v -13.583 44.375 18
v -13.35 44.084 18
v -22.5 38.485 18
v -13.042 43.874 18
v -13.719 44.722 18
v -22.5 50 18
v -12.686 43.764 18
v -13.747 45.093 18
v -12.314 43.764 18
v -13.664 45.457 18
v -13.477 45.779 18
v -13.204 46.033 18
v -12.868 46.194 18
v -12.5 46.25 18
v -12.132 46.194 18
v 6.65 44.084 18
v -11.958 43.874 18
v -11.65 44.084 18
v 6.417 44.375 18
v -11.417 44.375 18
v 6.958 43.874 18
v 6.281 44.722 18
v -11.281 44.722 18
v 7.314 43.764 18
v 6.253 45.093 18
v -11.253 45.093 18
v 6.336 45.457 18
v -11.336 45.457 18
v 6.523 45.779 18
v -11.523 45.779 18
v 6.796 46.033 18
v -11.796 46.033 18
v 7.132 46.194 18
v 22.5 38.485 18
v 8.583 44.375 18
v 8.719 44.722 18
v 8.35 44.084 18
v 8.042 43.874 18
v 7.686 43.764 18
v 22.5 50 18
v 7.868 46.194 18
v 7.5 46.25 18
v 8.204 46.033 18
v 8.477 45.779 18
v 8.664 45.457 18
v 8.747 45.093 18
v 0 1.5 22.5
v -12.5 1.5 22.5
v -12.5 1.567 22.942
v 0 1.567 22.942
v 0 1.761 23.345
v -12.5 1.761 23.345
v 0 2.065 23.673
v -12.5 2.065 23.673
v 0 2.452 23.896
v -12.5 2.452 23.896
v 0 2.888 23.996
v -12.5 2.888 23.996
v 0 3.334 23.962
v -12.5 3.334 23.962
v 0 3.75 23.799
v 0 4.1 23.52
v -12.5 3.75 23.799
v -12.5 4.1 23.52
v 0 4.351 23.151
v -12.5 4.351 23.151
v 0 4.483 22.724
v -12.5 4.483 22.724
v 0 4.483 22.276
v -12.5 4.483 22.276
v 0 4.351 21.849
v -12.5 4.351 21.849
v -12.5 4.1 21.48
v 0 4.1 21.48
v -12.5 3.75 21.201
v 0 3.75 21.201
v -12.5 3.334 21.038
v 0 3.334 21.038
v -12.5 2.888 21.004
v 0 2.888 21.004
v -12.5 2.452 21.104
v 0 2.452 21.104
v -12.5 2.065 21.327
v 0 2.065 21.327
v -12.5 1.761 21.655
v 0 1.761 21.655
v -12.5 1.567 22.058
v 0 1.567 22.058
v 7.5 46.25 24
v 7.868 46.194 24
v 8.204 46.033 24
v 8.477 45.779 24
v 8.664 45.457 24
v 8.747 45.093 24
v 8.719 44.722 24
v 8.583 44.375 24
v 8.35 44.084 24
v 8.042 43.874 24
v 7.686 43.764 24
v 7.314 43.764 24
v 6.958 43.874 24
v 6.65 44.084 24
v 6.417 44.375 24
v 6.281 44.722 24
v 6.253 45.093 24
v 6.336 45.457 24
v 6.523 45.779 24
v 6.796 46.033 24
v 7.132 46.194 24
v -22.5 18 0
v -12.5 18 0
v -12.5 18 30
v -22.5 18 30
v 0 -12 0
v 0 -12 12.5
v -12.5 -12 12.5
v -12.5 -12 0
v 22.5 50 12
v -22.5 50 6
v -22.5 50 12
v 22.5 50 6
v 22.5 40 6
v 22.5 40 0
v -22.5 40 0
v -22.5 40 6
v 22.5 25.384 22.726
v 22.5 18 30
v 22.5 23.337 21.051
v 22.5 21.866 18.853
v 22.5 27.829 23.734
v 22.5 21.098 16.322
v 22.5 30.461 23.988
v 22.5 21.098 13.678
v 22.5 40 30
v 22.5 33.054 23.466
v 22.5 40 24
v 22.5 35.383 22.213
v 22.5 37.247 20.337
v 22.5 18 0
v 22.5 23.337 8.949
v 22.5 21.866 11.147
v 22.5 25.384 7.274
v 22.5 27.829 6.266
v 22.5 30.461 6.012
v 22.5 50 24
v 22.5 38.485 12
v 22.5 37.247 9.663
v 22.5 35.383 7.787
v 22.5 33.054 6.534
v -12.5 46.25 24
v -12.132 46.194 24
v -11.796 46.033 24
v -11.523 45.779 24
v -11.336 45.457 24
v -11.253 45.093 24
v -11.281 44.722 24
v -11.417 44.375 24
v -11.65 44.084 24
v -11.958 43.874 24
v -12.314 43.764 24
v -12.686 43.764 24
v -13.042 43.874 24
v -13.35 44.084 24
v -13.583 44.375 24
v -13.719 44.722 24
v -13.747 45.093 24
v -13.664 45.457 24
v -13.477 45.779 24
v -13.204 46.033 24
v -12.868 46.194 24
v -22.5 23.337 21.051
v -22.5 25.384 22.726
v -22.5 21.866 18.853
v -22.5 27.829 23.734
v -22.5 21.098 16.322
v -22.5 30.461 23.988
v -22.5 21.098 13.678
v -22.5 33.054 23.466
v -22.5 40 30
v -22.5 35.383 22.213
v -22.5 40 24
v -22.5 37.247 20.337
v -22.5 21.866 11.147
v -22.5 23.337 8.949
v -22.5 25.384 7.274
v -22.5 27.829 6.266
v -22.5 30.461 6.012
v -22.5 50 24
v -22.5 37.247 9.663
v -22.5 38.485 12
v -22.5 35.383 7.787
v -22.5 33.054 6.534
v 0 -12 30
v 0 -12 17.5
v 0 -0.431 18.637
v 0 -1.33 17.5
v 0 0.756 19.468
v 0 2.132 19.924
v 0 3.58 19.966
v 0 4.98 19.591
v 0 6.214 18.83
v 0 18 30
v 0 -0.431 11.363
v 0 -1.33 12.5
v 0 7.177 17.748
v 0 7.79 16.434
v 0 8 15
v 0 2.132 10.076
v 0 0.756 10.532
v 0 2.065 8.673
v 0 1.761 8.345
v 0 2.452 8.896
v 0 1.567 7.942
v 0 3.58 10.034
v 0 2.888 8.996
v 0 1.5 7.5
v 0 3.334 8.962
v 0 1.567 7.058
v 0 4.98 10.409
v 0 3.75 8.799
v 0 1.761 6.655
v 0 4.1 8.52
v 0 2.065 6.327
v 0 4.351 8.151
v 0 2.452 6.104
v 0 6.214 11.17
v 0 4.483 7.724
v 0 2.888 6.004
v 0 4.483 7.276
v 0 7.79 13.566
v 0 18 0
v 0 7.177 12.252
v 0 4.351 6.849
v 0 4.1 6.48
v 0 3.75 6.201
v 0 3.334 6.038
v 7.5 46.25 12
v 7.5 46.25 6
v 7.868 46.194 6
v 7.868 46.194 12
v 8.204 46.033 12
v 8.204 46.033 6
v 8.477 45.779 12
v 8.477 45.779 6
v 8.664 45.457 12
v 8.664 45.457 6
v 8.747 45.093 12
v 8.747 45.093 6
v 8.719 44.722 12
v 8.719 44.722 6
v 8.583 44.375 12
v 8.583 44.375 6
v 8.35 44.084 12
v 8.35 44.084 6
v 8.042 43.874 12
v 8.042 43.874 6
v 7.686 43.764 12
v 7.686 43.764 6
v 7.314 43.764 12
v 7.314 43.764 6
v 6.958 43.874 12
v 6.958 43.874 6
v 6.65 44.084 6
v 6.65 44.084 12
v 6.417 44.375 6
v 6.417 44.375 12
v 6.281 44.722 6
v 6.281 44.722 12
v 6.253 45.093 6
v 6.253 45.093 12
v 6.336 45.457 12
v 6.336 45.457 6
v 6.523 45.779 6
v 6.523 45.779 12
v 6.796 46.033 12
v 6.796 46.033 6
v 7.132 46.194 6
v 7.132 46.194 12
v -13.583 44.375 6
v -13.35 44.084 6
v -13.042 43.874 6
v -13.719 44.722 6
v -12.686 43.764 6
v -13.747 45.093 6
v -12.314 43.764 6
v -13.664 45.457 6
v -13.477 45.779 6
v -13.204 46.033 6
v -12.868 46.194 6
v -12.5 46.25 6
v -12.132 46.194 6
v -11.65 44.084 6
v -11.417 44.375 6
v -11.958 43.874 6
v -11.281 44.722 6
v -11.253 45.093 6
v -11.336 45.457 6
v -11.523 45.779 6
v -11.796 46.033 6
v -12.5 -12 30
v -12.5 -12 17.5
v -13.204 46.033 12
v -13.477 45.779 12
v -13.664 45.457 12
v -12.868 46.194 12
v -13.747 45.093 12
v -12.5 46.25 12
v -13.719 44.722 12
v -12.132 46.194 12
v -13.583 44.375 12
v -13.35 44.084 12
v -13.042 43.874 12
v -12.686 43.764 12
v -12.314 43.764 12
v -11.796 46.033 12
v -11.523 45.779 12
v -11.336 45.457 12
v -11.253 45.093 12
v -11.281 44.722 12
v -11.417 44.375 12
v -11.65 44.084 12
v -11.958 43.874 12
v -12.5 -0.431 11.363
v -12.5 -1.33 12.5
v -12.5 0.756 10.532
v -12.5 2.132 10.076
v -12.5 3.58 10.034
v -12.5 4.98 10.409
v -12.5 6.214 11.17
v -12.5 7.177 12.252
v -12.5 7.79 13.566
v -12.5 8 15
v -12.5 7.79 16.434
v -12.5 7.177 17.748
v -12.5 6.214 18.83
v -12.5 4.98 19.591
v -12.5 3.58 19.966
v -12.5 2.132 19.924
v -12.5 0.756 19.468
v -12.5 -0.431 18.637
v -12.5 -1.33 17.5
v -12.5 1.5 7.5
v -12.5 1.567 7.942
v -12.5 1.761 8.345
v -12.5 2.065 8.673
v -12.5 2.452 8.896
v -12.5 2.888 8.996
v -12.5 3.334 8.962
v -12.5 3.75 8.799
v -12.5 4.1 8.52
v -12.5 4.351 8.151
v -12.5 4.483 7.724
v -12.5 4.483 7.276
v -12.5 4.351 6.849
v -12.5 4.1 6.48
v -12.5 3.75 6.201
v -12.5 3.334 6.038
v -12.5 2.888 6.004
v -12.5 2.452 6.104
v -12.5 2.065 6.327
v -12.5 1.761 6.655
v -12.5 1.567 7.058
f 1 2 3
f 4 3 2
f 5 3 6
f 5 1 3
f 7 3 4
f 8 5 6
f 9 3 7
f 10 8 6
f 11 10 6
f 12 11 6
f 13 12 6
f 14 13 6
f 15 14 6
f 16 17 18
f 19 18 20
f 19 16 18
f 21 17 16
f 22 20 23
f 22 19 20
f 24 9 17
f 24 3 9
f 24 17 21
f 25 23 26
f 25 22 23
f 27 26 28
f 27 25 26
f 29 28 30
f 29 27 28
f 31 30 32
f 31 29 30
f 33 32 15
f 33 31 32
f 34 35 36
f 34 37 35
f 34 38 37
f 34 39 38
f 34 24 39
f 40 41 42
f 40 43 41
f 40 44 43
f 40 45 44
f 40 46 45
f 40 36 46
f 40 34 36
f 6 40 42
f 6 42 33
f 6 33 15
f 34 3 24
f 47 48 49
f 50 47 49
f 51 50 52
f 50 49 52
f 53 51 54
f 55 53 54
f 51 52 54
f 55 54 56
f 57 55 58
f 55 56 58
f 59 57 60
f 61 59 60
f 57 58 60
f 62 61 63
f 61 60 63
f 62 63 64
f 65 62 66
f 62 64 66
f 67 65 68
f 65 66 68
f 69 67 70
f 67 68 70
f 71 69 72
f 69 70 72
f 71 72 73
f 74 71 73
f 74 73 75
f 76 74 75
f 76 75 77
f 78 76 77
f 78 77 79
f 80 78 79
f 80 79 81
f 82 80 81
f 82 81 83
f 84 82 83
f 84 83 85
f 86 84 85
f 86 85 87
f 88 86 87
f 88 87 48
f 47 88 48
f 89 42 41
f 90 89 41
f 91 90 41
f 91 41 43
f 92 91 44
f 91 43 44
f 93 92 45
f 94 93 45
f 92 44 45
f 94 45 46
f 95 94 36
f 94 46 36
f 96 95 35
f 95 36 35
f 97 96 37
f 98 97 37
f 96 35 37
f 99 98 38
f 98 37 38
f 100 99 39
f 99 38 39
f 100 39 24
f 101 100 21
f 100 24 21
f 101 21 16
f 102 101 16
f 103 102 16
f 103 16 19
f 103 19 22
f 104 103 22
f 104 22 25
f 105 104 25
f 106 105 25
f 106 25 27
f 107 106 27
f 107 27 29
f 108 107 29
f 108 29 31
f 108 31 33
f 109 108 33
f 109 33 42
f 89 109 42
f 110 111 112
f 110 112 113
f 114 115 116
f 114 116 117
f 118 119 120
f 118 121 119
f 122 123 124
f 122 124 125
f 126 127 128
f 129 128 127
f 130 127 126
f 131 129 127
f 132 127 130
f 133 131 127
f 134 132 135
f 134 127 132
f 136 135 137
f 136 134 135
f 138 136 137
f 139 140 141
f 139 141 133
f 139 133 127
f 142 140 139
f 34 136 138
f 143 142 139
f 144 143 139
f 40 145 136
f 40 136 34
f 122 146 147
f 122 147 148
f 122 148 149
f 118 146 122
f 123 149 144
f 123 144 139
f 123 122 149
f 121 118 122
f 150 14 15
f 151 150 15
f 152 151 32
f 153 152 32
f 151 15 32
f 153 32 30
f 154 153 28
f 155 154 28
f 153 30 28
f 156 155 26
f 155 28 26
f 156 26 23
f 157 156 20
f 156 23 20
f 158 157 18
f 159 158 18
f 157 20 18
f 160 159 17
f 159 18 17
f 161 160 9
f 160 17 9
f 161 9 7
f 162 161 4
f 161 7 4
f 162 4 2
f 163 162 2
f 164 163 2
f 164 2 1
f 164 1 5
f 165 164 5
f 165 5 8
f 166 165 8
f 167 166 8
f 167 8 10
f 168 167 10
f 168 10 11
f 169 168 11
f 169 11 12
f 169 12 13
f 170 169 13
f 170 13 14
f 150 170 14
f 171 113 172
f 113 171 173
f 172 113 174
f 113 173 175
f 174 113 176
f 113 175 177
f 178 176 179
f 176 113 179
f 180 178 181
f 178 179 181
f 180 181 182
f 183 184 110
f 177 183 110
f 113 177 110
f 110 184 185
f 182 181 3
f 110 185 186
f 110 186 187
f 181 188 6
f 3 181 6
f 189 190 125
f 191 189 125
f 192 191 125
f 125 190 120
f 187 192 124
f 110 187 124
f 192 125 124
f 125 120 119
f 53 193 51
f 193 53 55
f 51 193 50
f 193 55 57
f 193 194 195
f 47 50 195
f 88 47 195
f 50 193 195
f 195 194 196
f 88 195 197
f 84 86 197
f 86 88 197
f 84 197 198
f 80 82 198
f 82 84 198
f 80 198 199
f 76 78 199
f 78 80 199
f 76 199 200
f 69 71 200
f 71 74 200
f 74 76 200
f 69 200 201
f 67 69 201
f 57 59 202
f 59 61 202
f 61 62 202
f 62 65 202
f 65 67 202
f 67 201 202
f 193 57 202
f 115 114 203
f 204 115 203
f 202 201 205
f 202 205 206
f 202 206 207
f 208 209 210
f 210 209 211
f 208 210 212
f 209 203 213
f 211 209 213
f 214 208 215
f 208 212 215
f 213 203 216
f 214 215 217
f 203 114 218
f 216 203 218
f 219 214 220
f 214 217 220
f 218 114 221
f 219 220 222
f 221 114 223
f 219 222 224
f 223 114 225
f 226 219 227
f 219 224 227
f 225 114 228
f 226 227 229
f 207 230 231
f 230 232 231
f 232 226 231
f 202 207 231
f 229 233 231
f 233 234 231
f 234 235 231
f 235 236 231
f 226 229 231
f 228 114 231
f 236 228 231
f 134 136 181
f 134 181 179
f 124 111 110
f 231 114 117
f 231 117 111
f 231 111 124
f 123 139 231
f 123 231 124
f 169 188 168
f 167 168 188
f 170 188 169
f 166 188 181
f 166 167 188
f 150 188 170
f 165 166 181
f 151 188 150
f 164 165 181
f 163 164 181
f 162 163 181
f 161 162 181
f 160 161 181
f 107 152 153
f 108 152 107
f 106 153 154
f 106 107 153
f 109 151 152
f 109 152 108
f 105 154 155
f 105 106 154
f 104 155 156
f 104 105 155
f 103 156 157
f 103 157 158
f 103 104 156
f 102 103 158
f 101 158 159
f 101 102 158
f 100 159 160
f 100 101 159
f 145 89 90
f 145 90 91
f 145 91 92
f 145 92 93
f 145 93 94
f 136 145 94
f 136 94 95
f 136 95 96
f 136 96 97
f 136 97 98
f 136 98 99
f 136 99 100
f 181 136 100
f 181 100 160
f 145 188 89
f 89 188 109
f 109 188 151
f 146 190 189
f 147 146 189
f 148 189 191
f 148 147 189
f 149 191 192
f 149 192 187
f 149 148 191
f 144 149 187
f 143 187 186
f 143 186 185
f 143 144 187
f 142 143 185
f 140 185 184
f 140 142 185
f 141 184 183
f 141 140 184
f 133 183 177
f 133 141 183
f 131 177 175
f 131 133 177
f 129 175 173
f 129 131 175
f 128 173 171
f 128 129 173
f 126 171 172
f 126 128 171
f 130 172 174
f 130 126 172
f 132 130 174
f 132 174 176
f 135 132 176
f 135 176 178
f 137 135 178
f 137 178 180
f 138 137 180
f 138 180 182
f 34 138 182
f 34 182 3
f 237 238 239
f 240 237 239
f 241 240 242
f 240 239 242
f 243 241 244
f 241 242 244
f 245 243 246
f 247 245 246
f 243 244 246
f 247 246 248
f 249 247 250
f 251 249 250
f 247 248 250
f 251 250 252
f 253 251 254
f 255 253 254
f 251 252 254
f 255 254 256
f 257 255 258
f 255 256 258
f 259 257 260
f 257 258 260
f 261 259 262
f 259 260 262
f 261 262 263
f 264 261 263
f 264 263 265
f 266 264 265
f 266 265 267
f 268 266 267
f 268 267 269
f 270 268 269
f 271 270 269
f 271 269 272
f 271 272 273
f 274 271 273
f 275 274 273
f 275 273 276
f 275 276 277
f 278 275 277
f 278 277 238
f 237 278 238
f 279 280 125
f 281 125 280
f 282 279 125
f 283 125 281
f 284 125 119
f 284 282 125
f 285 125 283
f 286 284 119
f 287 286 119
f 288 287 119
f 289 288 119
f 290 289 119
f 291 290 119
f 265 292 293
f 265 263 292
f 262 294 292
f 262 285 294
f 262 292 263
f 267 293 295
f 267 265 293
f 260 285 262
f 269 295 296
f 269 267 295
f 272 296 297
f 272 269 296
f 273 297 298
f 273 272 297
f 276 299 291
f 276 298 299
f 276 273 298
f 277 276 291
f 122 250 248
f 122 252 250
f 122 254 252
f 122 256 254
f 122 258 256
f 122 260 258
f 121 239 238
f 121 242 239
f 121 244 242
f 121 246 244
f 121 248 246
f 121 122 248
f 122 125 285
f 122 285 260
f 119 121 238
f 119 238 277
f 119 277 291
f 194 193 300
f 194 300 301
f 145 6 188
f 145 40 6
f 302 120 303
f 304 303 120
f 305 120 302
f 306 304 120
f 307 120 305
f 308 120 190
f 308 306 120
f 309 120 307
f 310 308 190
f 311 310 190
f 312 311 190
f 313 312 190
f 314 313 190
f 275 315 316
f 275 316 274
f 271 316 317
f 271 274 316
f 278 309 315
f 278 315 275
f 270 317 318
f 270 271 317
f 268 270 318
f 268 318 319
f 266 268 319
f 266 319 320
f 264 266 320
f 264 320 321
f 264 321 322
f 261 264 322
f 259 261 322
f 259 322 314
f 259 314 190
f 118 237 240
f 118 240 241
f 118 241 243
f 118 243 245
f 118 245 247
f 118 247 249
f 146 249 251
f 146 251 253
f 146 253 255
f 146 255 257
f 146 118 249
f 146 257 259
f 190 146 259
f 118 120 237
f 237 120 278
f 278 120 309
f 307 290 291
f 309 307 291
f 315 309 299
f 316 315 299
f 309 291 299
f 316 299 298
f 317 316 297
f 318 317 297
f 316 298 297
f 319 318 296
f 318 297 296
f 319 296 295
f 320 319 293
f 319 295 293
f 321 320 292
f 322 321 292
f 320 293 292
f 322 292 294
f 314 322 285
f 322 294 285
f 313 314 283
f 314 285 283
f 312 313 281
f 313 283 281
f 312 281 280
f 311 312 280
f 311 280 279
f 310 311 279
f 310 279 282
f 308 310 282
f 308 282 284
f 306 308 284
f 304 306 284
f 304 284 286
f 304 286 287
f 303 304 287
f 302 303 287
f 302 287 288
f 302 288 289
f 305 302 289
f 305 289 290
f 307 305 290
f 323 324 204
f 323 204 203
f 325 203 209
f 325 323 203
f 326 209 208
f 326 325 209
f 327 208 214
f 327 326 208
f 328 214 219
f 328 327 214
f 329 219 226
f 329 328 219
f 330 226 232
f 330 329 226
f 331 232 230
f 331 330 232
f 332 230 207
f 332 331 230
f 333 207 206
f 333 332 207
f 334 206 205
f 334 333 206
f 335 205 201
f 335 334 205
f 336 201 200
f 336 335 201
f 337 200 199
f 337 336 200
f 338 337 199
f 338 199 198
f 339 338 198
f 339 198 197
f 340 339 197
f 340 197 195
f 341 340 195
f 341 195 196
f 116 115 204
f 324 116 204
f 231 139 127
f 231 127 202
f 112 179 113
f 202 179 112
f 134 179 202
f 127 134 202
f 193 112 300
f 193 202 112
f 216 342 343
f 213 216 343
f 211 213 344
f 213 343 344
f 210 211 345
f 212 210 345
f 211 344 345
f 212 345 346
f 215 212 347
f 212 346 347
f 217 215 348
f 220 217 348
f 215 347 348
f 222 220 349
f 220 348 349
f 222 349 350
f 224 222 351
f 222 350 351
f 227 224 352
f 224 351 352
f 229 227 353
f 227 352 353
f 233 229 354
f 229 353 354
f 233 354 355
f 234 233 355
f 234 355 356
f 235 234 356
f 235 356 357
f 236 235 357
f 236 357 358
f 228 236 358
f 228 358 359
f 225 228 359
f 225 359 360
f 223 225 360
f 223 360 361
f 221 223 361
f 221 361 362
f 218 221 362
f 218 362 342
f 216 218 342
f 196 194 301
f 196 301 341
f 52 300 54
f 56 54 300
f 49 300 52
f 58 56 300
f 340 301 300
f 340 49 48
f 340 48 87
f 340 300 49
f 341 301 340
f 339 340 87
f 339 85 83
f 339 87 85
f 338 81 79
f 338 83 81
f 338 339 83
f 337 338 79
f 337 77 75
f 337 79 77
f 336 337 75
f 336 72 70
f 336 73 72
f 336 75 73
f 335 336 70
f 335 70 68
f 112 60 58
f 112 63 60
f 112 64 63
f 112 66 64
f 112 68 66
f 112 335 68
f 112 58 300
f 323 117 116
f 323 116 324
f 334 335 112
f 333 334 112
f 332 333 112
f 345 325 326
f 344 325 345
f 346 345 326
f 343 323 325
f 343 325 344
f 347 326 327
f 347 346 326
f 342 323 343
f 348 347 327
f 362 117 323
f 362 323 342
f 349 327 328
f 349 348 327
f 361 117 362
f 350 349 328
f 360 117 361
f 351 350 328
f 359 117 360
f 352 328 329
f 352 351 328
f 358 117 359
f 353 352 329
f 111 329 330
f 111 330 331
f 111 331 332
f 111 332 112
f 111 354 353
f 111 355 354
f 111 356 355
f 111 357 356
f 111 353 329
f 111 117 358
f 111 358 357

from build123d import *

# Parameters (mm, degrees)
SKETCH1_R           = 5
BOSS_EXTRUDE1_DEPTH = 22.5
SKETCH3_W           = 10
SKETCH3_H           = 30
CUT_EXTRUDE1_DEPTH  = 45
SKETCH4_R           = 1.5
CUT_EXTRUDE2_DEPTH  = 45
SKETCH4_3_R         = 1.5
CUT_EXTRUDE3_DEPTH  = 45
SKETCH6_W           = 10
SKETCH6_H           = 30
CUT_EXTRUDE4_DEPTH  = 45
SKETCH7_W           = 12.5
SKETCH7_H           = 30
CUT_EXTRUDE5_DEPTH  = 45
SKETCH8_W           = 5
SKETCH8_H           = 10.669872981
CUT_EXTRUDE6_DEPTH  = 45
SKETCH9_R           = 1.25
CUT_EXTRUDE7_DEPTH  = 150


with BuildPart() as part:
    # Sketch1 → Boss-Extrude1 (new, symmetric)
    with BuildSketch(Plane(origin=(0, 0, 0), x_dir=(0, 0, -1), z_dir=(1, 0, 0))):
        with BuildLine():
            Line((-24, 50), (-24, 40))
            Line((-24, 40), (-30, 40))
            Line((-30, 40), (-30, 0))
            Line((-30, 0), (-30, -12))
            Line((-30, -12), (0, -12))
            Line((0, -12), (0, 0))
            Line((0, 0), (0, 40))
            Line((0, 40), (-6, 40))
            Line((-6, 40), (-6, 50))
            Line((-6, 50), (-12, 50))
            Line((-12, 50), (-12, 38.485281374))
            ThreePointArc((-12, 38.485281374), (-15, 21), (-18, 38.485281374))
            Line((-18, 38.485281374), (-18, 50))
            Line((-18, 50), (-24, 50))
        make_face()
        with Locations((-15, 3)):
            Circle(SKETCH1_R, mode=Mode.SUBTRACT)
    extrude(amount=BOSS_EXTRUDE1_DEPTH, both=True)

    # Sketch3 → Cut-Extrude1 (cut)
    with BuildSketch(Plane(origin=(0, 0, 0), x_dir=(-1, 0, 0), z_dir=(0, 0, -1))):
        with Locations((17.5, 3)):
            Rectangle(SKETCH3_W, SKETCH3_H)
    extrude(amount=-CUT_EXTRUDE1_DEPTH, mode=Mode.SUBTRACT)

    # Sketch4 → Cut-Extrude2 (cut)
    with BuildSketch(Plane.ZY.offset(12.5)):
        with Locations((22.5, 3)):
            Circle(SKETCH4_R)
    extrude(amount=-CUT_EXTRUDE2_DEPTH, mode=Mode.SUBTRACT)

    # Sketch4<3> → Cut-Extrude3 (cut)
    with BuildSketch(Plane.ZY.offset(12.5)):
        with Locations((7.5, 3)):
            Circle(SKETCH4_3_R)
    extrude(amount=-CUT_EXTRUDE3_DEPTH, mode=Mode.SUBTRACT)

    # Sketch6 → Cut-Extrude4 (cut)
    with BuildSketch(Plane(origin=(0, 0, 0), x_dir=(-1, 0, 0), z_dir=(0, 0, -1))):
        with Locations((-5, 3)):
            Rectangle(SKETCH6_W, SKETCH6_H)
    extrude(amount=-CUT_EXTRUDE4_DEPTH, mode=Mode.SUBTRACT)

    # Sketch7 → Cut-Extrude5 (cut)
    with BuildSketch(Plane(origin=(0, 0, 0), x_dir=(-1, 0, 0), z_dir=(0, 0, -1))):
        with Locations((-16.25, 3)):
            Rectangle(SKETCH7_W, SKETCH7_H)
    extrude(amount=-CUT_EXTRUDE5_DEPTH, mode=Mode.SUBTRACT)

    # Sketch8 → Cut-Extrude6 (cut)
    with BuildSketch(Plane(origin=(0, 0, 0), x_dir=(0, 0, -1), z_dir=(1, 0, 0))):
        with Locations((-15, -6.66506351)):
            Rectangle(SKETCH8_W, SKETCH8_H)
    extrude(amount=-CUT_EXTRUDE6_DEPTH, mode=Mode.SUBTRACT)

    # Sketch9 → Cut-Extrude7 (cut)
    with BuildSketch(Plane(origin=(0, 0, 6), x_dir=(-1, 0, 0), z_dir=(0, 0, -1))):
        with Locations((12.5, 45)):
            Circle(SKETCH9_R)
        with Locations((-7.5, 45)):
            Circle(SKETCH9_R)
    extrude(amount=-CUT_EXTRUDE7_DEPTH, mode=Mode.SUBTRACT)


solid = part.part
